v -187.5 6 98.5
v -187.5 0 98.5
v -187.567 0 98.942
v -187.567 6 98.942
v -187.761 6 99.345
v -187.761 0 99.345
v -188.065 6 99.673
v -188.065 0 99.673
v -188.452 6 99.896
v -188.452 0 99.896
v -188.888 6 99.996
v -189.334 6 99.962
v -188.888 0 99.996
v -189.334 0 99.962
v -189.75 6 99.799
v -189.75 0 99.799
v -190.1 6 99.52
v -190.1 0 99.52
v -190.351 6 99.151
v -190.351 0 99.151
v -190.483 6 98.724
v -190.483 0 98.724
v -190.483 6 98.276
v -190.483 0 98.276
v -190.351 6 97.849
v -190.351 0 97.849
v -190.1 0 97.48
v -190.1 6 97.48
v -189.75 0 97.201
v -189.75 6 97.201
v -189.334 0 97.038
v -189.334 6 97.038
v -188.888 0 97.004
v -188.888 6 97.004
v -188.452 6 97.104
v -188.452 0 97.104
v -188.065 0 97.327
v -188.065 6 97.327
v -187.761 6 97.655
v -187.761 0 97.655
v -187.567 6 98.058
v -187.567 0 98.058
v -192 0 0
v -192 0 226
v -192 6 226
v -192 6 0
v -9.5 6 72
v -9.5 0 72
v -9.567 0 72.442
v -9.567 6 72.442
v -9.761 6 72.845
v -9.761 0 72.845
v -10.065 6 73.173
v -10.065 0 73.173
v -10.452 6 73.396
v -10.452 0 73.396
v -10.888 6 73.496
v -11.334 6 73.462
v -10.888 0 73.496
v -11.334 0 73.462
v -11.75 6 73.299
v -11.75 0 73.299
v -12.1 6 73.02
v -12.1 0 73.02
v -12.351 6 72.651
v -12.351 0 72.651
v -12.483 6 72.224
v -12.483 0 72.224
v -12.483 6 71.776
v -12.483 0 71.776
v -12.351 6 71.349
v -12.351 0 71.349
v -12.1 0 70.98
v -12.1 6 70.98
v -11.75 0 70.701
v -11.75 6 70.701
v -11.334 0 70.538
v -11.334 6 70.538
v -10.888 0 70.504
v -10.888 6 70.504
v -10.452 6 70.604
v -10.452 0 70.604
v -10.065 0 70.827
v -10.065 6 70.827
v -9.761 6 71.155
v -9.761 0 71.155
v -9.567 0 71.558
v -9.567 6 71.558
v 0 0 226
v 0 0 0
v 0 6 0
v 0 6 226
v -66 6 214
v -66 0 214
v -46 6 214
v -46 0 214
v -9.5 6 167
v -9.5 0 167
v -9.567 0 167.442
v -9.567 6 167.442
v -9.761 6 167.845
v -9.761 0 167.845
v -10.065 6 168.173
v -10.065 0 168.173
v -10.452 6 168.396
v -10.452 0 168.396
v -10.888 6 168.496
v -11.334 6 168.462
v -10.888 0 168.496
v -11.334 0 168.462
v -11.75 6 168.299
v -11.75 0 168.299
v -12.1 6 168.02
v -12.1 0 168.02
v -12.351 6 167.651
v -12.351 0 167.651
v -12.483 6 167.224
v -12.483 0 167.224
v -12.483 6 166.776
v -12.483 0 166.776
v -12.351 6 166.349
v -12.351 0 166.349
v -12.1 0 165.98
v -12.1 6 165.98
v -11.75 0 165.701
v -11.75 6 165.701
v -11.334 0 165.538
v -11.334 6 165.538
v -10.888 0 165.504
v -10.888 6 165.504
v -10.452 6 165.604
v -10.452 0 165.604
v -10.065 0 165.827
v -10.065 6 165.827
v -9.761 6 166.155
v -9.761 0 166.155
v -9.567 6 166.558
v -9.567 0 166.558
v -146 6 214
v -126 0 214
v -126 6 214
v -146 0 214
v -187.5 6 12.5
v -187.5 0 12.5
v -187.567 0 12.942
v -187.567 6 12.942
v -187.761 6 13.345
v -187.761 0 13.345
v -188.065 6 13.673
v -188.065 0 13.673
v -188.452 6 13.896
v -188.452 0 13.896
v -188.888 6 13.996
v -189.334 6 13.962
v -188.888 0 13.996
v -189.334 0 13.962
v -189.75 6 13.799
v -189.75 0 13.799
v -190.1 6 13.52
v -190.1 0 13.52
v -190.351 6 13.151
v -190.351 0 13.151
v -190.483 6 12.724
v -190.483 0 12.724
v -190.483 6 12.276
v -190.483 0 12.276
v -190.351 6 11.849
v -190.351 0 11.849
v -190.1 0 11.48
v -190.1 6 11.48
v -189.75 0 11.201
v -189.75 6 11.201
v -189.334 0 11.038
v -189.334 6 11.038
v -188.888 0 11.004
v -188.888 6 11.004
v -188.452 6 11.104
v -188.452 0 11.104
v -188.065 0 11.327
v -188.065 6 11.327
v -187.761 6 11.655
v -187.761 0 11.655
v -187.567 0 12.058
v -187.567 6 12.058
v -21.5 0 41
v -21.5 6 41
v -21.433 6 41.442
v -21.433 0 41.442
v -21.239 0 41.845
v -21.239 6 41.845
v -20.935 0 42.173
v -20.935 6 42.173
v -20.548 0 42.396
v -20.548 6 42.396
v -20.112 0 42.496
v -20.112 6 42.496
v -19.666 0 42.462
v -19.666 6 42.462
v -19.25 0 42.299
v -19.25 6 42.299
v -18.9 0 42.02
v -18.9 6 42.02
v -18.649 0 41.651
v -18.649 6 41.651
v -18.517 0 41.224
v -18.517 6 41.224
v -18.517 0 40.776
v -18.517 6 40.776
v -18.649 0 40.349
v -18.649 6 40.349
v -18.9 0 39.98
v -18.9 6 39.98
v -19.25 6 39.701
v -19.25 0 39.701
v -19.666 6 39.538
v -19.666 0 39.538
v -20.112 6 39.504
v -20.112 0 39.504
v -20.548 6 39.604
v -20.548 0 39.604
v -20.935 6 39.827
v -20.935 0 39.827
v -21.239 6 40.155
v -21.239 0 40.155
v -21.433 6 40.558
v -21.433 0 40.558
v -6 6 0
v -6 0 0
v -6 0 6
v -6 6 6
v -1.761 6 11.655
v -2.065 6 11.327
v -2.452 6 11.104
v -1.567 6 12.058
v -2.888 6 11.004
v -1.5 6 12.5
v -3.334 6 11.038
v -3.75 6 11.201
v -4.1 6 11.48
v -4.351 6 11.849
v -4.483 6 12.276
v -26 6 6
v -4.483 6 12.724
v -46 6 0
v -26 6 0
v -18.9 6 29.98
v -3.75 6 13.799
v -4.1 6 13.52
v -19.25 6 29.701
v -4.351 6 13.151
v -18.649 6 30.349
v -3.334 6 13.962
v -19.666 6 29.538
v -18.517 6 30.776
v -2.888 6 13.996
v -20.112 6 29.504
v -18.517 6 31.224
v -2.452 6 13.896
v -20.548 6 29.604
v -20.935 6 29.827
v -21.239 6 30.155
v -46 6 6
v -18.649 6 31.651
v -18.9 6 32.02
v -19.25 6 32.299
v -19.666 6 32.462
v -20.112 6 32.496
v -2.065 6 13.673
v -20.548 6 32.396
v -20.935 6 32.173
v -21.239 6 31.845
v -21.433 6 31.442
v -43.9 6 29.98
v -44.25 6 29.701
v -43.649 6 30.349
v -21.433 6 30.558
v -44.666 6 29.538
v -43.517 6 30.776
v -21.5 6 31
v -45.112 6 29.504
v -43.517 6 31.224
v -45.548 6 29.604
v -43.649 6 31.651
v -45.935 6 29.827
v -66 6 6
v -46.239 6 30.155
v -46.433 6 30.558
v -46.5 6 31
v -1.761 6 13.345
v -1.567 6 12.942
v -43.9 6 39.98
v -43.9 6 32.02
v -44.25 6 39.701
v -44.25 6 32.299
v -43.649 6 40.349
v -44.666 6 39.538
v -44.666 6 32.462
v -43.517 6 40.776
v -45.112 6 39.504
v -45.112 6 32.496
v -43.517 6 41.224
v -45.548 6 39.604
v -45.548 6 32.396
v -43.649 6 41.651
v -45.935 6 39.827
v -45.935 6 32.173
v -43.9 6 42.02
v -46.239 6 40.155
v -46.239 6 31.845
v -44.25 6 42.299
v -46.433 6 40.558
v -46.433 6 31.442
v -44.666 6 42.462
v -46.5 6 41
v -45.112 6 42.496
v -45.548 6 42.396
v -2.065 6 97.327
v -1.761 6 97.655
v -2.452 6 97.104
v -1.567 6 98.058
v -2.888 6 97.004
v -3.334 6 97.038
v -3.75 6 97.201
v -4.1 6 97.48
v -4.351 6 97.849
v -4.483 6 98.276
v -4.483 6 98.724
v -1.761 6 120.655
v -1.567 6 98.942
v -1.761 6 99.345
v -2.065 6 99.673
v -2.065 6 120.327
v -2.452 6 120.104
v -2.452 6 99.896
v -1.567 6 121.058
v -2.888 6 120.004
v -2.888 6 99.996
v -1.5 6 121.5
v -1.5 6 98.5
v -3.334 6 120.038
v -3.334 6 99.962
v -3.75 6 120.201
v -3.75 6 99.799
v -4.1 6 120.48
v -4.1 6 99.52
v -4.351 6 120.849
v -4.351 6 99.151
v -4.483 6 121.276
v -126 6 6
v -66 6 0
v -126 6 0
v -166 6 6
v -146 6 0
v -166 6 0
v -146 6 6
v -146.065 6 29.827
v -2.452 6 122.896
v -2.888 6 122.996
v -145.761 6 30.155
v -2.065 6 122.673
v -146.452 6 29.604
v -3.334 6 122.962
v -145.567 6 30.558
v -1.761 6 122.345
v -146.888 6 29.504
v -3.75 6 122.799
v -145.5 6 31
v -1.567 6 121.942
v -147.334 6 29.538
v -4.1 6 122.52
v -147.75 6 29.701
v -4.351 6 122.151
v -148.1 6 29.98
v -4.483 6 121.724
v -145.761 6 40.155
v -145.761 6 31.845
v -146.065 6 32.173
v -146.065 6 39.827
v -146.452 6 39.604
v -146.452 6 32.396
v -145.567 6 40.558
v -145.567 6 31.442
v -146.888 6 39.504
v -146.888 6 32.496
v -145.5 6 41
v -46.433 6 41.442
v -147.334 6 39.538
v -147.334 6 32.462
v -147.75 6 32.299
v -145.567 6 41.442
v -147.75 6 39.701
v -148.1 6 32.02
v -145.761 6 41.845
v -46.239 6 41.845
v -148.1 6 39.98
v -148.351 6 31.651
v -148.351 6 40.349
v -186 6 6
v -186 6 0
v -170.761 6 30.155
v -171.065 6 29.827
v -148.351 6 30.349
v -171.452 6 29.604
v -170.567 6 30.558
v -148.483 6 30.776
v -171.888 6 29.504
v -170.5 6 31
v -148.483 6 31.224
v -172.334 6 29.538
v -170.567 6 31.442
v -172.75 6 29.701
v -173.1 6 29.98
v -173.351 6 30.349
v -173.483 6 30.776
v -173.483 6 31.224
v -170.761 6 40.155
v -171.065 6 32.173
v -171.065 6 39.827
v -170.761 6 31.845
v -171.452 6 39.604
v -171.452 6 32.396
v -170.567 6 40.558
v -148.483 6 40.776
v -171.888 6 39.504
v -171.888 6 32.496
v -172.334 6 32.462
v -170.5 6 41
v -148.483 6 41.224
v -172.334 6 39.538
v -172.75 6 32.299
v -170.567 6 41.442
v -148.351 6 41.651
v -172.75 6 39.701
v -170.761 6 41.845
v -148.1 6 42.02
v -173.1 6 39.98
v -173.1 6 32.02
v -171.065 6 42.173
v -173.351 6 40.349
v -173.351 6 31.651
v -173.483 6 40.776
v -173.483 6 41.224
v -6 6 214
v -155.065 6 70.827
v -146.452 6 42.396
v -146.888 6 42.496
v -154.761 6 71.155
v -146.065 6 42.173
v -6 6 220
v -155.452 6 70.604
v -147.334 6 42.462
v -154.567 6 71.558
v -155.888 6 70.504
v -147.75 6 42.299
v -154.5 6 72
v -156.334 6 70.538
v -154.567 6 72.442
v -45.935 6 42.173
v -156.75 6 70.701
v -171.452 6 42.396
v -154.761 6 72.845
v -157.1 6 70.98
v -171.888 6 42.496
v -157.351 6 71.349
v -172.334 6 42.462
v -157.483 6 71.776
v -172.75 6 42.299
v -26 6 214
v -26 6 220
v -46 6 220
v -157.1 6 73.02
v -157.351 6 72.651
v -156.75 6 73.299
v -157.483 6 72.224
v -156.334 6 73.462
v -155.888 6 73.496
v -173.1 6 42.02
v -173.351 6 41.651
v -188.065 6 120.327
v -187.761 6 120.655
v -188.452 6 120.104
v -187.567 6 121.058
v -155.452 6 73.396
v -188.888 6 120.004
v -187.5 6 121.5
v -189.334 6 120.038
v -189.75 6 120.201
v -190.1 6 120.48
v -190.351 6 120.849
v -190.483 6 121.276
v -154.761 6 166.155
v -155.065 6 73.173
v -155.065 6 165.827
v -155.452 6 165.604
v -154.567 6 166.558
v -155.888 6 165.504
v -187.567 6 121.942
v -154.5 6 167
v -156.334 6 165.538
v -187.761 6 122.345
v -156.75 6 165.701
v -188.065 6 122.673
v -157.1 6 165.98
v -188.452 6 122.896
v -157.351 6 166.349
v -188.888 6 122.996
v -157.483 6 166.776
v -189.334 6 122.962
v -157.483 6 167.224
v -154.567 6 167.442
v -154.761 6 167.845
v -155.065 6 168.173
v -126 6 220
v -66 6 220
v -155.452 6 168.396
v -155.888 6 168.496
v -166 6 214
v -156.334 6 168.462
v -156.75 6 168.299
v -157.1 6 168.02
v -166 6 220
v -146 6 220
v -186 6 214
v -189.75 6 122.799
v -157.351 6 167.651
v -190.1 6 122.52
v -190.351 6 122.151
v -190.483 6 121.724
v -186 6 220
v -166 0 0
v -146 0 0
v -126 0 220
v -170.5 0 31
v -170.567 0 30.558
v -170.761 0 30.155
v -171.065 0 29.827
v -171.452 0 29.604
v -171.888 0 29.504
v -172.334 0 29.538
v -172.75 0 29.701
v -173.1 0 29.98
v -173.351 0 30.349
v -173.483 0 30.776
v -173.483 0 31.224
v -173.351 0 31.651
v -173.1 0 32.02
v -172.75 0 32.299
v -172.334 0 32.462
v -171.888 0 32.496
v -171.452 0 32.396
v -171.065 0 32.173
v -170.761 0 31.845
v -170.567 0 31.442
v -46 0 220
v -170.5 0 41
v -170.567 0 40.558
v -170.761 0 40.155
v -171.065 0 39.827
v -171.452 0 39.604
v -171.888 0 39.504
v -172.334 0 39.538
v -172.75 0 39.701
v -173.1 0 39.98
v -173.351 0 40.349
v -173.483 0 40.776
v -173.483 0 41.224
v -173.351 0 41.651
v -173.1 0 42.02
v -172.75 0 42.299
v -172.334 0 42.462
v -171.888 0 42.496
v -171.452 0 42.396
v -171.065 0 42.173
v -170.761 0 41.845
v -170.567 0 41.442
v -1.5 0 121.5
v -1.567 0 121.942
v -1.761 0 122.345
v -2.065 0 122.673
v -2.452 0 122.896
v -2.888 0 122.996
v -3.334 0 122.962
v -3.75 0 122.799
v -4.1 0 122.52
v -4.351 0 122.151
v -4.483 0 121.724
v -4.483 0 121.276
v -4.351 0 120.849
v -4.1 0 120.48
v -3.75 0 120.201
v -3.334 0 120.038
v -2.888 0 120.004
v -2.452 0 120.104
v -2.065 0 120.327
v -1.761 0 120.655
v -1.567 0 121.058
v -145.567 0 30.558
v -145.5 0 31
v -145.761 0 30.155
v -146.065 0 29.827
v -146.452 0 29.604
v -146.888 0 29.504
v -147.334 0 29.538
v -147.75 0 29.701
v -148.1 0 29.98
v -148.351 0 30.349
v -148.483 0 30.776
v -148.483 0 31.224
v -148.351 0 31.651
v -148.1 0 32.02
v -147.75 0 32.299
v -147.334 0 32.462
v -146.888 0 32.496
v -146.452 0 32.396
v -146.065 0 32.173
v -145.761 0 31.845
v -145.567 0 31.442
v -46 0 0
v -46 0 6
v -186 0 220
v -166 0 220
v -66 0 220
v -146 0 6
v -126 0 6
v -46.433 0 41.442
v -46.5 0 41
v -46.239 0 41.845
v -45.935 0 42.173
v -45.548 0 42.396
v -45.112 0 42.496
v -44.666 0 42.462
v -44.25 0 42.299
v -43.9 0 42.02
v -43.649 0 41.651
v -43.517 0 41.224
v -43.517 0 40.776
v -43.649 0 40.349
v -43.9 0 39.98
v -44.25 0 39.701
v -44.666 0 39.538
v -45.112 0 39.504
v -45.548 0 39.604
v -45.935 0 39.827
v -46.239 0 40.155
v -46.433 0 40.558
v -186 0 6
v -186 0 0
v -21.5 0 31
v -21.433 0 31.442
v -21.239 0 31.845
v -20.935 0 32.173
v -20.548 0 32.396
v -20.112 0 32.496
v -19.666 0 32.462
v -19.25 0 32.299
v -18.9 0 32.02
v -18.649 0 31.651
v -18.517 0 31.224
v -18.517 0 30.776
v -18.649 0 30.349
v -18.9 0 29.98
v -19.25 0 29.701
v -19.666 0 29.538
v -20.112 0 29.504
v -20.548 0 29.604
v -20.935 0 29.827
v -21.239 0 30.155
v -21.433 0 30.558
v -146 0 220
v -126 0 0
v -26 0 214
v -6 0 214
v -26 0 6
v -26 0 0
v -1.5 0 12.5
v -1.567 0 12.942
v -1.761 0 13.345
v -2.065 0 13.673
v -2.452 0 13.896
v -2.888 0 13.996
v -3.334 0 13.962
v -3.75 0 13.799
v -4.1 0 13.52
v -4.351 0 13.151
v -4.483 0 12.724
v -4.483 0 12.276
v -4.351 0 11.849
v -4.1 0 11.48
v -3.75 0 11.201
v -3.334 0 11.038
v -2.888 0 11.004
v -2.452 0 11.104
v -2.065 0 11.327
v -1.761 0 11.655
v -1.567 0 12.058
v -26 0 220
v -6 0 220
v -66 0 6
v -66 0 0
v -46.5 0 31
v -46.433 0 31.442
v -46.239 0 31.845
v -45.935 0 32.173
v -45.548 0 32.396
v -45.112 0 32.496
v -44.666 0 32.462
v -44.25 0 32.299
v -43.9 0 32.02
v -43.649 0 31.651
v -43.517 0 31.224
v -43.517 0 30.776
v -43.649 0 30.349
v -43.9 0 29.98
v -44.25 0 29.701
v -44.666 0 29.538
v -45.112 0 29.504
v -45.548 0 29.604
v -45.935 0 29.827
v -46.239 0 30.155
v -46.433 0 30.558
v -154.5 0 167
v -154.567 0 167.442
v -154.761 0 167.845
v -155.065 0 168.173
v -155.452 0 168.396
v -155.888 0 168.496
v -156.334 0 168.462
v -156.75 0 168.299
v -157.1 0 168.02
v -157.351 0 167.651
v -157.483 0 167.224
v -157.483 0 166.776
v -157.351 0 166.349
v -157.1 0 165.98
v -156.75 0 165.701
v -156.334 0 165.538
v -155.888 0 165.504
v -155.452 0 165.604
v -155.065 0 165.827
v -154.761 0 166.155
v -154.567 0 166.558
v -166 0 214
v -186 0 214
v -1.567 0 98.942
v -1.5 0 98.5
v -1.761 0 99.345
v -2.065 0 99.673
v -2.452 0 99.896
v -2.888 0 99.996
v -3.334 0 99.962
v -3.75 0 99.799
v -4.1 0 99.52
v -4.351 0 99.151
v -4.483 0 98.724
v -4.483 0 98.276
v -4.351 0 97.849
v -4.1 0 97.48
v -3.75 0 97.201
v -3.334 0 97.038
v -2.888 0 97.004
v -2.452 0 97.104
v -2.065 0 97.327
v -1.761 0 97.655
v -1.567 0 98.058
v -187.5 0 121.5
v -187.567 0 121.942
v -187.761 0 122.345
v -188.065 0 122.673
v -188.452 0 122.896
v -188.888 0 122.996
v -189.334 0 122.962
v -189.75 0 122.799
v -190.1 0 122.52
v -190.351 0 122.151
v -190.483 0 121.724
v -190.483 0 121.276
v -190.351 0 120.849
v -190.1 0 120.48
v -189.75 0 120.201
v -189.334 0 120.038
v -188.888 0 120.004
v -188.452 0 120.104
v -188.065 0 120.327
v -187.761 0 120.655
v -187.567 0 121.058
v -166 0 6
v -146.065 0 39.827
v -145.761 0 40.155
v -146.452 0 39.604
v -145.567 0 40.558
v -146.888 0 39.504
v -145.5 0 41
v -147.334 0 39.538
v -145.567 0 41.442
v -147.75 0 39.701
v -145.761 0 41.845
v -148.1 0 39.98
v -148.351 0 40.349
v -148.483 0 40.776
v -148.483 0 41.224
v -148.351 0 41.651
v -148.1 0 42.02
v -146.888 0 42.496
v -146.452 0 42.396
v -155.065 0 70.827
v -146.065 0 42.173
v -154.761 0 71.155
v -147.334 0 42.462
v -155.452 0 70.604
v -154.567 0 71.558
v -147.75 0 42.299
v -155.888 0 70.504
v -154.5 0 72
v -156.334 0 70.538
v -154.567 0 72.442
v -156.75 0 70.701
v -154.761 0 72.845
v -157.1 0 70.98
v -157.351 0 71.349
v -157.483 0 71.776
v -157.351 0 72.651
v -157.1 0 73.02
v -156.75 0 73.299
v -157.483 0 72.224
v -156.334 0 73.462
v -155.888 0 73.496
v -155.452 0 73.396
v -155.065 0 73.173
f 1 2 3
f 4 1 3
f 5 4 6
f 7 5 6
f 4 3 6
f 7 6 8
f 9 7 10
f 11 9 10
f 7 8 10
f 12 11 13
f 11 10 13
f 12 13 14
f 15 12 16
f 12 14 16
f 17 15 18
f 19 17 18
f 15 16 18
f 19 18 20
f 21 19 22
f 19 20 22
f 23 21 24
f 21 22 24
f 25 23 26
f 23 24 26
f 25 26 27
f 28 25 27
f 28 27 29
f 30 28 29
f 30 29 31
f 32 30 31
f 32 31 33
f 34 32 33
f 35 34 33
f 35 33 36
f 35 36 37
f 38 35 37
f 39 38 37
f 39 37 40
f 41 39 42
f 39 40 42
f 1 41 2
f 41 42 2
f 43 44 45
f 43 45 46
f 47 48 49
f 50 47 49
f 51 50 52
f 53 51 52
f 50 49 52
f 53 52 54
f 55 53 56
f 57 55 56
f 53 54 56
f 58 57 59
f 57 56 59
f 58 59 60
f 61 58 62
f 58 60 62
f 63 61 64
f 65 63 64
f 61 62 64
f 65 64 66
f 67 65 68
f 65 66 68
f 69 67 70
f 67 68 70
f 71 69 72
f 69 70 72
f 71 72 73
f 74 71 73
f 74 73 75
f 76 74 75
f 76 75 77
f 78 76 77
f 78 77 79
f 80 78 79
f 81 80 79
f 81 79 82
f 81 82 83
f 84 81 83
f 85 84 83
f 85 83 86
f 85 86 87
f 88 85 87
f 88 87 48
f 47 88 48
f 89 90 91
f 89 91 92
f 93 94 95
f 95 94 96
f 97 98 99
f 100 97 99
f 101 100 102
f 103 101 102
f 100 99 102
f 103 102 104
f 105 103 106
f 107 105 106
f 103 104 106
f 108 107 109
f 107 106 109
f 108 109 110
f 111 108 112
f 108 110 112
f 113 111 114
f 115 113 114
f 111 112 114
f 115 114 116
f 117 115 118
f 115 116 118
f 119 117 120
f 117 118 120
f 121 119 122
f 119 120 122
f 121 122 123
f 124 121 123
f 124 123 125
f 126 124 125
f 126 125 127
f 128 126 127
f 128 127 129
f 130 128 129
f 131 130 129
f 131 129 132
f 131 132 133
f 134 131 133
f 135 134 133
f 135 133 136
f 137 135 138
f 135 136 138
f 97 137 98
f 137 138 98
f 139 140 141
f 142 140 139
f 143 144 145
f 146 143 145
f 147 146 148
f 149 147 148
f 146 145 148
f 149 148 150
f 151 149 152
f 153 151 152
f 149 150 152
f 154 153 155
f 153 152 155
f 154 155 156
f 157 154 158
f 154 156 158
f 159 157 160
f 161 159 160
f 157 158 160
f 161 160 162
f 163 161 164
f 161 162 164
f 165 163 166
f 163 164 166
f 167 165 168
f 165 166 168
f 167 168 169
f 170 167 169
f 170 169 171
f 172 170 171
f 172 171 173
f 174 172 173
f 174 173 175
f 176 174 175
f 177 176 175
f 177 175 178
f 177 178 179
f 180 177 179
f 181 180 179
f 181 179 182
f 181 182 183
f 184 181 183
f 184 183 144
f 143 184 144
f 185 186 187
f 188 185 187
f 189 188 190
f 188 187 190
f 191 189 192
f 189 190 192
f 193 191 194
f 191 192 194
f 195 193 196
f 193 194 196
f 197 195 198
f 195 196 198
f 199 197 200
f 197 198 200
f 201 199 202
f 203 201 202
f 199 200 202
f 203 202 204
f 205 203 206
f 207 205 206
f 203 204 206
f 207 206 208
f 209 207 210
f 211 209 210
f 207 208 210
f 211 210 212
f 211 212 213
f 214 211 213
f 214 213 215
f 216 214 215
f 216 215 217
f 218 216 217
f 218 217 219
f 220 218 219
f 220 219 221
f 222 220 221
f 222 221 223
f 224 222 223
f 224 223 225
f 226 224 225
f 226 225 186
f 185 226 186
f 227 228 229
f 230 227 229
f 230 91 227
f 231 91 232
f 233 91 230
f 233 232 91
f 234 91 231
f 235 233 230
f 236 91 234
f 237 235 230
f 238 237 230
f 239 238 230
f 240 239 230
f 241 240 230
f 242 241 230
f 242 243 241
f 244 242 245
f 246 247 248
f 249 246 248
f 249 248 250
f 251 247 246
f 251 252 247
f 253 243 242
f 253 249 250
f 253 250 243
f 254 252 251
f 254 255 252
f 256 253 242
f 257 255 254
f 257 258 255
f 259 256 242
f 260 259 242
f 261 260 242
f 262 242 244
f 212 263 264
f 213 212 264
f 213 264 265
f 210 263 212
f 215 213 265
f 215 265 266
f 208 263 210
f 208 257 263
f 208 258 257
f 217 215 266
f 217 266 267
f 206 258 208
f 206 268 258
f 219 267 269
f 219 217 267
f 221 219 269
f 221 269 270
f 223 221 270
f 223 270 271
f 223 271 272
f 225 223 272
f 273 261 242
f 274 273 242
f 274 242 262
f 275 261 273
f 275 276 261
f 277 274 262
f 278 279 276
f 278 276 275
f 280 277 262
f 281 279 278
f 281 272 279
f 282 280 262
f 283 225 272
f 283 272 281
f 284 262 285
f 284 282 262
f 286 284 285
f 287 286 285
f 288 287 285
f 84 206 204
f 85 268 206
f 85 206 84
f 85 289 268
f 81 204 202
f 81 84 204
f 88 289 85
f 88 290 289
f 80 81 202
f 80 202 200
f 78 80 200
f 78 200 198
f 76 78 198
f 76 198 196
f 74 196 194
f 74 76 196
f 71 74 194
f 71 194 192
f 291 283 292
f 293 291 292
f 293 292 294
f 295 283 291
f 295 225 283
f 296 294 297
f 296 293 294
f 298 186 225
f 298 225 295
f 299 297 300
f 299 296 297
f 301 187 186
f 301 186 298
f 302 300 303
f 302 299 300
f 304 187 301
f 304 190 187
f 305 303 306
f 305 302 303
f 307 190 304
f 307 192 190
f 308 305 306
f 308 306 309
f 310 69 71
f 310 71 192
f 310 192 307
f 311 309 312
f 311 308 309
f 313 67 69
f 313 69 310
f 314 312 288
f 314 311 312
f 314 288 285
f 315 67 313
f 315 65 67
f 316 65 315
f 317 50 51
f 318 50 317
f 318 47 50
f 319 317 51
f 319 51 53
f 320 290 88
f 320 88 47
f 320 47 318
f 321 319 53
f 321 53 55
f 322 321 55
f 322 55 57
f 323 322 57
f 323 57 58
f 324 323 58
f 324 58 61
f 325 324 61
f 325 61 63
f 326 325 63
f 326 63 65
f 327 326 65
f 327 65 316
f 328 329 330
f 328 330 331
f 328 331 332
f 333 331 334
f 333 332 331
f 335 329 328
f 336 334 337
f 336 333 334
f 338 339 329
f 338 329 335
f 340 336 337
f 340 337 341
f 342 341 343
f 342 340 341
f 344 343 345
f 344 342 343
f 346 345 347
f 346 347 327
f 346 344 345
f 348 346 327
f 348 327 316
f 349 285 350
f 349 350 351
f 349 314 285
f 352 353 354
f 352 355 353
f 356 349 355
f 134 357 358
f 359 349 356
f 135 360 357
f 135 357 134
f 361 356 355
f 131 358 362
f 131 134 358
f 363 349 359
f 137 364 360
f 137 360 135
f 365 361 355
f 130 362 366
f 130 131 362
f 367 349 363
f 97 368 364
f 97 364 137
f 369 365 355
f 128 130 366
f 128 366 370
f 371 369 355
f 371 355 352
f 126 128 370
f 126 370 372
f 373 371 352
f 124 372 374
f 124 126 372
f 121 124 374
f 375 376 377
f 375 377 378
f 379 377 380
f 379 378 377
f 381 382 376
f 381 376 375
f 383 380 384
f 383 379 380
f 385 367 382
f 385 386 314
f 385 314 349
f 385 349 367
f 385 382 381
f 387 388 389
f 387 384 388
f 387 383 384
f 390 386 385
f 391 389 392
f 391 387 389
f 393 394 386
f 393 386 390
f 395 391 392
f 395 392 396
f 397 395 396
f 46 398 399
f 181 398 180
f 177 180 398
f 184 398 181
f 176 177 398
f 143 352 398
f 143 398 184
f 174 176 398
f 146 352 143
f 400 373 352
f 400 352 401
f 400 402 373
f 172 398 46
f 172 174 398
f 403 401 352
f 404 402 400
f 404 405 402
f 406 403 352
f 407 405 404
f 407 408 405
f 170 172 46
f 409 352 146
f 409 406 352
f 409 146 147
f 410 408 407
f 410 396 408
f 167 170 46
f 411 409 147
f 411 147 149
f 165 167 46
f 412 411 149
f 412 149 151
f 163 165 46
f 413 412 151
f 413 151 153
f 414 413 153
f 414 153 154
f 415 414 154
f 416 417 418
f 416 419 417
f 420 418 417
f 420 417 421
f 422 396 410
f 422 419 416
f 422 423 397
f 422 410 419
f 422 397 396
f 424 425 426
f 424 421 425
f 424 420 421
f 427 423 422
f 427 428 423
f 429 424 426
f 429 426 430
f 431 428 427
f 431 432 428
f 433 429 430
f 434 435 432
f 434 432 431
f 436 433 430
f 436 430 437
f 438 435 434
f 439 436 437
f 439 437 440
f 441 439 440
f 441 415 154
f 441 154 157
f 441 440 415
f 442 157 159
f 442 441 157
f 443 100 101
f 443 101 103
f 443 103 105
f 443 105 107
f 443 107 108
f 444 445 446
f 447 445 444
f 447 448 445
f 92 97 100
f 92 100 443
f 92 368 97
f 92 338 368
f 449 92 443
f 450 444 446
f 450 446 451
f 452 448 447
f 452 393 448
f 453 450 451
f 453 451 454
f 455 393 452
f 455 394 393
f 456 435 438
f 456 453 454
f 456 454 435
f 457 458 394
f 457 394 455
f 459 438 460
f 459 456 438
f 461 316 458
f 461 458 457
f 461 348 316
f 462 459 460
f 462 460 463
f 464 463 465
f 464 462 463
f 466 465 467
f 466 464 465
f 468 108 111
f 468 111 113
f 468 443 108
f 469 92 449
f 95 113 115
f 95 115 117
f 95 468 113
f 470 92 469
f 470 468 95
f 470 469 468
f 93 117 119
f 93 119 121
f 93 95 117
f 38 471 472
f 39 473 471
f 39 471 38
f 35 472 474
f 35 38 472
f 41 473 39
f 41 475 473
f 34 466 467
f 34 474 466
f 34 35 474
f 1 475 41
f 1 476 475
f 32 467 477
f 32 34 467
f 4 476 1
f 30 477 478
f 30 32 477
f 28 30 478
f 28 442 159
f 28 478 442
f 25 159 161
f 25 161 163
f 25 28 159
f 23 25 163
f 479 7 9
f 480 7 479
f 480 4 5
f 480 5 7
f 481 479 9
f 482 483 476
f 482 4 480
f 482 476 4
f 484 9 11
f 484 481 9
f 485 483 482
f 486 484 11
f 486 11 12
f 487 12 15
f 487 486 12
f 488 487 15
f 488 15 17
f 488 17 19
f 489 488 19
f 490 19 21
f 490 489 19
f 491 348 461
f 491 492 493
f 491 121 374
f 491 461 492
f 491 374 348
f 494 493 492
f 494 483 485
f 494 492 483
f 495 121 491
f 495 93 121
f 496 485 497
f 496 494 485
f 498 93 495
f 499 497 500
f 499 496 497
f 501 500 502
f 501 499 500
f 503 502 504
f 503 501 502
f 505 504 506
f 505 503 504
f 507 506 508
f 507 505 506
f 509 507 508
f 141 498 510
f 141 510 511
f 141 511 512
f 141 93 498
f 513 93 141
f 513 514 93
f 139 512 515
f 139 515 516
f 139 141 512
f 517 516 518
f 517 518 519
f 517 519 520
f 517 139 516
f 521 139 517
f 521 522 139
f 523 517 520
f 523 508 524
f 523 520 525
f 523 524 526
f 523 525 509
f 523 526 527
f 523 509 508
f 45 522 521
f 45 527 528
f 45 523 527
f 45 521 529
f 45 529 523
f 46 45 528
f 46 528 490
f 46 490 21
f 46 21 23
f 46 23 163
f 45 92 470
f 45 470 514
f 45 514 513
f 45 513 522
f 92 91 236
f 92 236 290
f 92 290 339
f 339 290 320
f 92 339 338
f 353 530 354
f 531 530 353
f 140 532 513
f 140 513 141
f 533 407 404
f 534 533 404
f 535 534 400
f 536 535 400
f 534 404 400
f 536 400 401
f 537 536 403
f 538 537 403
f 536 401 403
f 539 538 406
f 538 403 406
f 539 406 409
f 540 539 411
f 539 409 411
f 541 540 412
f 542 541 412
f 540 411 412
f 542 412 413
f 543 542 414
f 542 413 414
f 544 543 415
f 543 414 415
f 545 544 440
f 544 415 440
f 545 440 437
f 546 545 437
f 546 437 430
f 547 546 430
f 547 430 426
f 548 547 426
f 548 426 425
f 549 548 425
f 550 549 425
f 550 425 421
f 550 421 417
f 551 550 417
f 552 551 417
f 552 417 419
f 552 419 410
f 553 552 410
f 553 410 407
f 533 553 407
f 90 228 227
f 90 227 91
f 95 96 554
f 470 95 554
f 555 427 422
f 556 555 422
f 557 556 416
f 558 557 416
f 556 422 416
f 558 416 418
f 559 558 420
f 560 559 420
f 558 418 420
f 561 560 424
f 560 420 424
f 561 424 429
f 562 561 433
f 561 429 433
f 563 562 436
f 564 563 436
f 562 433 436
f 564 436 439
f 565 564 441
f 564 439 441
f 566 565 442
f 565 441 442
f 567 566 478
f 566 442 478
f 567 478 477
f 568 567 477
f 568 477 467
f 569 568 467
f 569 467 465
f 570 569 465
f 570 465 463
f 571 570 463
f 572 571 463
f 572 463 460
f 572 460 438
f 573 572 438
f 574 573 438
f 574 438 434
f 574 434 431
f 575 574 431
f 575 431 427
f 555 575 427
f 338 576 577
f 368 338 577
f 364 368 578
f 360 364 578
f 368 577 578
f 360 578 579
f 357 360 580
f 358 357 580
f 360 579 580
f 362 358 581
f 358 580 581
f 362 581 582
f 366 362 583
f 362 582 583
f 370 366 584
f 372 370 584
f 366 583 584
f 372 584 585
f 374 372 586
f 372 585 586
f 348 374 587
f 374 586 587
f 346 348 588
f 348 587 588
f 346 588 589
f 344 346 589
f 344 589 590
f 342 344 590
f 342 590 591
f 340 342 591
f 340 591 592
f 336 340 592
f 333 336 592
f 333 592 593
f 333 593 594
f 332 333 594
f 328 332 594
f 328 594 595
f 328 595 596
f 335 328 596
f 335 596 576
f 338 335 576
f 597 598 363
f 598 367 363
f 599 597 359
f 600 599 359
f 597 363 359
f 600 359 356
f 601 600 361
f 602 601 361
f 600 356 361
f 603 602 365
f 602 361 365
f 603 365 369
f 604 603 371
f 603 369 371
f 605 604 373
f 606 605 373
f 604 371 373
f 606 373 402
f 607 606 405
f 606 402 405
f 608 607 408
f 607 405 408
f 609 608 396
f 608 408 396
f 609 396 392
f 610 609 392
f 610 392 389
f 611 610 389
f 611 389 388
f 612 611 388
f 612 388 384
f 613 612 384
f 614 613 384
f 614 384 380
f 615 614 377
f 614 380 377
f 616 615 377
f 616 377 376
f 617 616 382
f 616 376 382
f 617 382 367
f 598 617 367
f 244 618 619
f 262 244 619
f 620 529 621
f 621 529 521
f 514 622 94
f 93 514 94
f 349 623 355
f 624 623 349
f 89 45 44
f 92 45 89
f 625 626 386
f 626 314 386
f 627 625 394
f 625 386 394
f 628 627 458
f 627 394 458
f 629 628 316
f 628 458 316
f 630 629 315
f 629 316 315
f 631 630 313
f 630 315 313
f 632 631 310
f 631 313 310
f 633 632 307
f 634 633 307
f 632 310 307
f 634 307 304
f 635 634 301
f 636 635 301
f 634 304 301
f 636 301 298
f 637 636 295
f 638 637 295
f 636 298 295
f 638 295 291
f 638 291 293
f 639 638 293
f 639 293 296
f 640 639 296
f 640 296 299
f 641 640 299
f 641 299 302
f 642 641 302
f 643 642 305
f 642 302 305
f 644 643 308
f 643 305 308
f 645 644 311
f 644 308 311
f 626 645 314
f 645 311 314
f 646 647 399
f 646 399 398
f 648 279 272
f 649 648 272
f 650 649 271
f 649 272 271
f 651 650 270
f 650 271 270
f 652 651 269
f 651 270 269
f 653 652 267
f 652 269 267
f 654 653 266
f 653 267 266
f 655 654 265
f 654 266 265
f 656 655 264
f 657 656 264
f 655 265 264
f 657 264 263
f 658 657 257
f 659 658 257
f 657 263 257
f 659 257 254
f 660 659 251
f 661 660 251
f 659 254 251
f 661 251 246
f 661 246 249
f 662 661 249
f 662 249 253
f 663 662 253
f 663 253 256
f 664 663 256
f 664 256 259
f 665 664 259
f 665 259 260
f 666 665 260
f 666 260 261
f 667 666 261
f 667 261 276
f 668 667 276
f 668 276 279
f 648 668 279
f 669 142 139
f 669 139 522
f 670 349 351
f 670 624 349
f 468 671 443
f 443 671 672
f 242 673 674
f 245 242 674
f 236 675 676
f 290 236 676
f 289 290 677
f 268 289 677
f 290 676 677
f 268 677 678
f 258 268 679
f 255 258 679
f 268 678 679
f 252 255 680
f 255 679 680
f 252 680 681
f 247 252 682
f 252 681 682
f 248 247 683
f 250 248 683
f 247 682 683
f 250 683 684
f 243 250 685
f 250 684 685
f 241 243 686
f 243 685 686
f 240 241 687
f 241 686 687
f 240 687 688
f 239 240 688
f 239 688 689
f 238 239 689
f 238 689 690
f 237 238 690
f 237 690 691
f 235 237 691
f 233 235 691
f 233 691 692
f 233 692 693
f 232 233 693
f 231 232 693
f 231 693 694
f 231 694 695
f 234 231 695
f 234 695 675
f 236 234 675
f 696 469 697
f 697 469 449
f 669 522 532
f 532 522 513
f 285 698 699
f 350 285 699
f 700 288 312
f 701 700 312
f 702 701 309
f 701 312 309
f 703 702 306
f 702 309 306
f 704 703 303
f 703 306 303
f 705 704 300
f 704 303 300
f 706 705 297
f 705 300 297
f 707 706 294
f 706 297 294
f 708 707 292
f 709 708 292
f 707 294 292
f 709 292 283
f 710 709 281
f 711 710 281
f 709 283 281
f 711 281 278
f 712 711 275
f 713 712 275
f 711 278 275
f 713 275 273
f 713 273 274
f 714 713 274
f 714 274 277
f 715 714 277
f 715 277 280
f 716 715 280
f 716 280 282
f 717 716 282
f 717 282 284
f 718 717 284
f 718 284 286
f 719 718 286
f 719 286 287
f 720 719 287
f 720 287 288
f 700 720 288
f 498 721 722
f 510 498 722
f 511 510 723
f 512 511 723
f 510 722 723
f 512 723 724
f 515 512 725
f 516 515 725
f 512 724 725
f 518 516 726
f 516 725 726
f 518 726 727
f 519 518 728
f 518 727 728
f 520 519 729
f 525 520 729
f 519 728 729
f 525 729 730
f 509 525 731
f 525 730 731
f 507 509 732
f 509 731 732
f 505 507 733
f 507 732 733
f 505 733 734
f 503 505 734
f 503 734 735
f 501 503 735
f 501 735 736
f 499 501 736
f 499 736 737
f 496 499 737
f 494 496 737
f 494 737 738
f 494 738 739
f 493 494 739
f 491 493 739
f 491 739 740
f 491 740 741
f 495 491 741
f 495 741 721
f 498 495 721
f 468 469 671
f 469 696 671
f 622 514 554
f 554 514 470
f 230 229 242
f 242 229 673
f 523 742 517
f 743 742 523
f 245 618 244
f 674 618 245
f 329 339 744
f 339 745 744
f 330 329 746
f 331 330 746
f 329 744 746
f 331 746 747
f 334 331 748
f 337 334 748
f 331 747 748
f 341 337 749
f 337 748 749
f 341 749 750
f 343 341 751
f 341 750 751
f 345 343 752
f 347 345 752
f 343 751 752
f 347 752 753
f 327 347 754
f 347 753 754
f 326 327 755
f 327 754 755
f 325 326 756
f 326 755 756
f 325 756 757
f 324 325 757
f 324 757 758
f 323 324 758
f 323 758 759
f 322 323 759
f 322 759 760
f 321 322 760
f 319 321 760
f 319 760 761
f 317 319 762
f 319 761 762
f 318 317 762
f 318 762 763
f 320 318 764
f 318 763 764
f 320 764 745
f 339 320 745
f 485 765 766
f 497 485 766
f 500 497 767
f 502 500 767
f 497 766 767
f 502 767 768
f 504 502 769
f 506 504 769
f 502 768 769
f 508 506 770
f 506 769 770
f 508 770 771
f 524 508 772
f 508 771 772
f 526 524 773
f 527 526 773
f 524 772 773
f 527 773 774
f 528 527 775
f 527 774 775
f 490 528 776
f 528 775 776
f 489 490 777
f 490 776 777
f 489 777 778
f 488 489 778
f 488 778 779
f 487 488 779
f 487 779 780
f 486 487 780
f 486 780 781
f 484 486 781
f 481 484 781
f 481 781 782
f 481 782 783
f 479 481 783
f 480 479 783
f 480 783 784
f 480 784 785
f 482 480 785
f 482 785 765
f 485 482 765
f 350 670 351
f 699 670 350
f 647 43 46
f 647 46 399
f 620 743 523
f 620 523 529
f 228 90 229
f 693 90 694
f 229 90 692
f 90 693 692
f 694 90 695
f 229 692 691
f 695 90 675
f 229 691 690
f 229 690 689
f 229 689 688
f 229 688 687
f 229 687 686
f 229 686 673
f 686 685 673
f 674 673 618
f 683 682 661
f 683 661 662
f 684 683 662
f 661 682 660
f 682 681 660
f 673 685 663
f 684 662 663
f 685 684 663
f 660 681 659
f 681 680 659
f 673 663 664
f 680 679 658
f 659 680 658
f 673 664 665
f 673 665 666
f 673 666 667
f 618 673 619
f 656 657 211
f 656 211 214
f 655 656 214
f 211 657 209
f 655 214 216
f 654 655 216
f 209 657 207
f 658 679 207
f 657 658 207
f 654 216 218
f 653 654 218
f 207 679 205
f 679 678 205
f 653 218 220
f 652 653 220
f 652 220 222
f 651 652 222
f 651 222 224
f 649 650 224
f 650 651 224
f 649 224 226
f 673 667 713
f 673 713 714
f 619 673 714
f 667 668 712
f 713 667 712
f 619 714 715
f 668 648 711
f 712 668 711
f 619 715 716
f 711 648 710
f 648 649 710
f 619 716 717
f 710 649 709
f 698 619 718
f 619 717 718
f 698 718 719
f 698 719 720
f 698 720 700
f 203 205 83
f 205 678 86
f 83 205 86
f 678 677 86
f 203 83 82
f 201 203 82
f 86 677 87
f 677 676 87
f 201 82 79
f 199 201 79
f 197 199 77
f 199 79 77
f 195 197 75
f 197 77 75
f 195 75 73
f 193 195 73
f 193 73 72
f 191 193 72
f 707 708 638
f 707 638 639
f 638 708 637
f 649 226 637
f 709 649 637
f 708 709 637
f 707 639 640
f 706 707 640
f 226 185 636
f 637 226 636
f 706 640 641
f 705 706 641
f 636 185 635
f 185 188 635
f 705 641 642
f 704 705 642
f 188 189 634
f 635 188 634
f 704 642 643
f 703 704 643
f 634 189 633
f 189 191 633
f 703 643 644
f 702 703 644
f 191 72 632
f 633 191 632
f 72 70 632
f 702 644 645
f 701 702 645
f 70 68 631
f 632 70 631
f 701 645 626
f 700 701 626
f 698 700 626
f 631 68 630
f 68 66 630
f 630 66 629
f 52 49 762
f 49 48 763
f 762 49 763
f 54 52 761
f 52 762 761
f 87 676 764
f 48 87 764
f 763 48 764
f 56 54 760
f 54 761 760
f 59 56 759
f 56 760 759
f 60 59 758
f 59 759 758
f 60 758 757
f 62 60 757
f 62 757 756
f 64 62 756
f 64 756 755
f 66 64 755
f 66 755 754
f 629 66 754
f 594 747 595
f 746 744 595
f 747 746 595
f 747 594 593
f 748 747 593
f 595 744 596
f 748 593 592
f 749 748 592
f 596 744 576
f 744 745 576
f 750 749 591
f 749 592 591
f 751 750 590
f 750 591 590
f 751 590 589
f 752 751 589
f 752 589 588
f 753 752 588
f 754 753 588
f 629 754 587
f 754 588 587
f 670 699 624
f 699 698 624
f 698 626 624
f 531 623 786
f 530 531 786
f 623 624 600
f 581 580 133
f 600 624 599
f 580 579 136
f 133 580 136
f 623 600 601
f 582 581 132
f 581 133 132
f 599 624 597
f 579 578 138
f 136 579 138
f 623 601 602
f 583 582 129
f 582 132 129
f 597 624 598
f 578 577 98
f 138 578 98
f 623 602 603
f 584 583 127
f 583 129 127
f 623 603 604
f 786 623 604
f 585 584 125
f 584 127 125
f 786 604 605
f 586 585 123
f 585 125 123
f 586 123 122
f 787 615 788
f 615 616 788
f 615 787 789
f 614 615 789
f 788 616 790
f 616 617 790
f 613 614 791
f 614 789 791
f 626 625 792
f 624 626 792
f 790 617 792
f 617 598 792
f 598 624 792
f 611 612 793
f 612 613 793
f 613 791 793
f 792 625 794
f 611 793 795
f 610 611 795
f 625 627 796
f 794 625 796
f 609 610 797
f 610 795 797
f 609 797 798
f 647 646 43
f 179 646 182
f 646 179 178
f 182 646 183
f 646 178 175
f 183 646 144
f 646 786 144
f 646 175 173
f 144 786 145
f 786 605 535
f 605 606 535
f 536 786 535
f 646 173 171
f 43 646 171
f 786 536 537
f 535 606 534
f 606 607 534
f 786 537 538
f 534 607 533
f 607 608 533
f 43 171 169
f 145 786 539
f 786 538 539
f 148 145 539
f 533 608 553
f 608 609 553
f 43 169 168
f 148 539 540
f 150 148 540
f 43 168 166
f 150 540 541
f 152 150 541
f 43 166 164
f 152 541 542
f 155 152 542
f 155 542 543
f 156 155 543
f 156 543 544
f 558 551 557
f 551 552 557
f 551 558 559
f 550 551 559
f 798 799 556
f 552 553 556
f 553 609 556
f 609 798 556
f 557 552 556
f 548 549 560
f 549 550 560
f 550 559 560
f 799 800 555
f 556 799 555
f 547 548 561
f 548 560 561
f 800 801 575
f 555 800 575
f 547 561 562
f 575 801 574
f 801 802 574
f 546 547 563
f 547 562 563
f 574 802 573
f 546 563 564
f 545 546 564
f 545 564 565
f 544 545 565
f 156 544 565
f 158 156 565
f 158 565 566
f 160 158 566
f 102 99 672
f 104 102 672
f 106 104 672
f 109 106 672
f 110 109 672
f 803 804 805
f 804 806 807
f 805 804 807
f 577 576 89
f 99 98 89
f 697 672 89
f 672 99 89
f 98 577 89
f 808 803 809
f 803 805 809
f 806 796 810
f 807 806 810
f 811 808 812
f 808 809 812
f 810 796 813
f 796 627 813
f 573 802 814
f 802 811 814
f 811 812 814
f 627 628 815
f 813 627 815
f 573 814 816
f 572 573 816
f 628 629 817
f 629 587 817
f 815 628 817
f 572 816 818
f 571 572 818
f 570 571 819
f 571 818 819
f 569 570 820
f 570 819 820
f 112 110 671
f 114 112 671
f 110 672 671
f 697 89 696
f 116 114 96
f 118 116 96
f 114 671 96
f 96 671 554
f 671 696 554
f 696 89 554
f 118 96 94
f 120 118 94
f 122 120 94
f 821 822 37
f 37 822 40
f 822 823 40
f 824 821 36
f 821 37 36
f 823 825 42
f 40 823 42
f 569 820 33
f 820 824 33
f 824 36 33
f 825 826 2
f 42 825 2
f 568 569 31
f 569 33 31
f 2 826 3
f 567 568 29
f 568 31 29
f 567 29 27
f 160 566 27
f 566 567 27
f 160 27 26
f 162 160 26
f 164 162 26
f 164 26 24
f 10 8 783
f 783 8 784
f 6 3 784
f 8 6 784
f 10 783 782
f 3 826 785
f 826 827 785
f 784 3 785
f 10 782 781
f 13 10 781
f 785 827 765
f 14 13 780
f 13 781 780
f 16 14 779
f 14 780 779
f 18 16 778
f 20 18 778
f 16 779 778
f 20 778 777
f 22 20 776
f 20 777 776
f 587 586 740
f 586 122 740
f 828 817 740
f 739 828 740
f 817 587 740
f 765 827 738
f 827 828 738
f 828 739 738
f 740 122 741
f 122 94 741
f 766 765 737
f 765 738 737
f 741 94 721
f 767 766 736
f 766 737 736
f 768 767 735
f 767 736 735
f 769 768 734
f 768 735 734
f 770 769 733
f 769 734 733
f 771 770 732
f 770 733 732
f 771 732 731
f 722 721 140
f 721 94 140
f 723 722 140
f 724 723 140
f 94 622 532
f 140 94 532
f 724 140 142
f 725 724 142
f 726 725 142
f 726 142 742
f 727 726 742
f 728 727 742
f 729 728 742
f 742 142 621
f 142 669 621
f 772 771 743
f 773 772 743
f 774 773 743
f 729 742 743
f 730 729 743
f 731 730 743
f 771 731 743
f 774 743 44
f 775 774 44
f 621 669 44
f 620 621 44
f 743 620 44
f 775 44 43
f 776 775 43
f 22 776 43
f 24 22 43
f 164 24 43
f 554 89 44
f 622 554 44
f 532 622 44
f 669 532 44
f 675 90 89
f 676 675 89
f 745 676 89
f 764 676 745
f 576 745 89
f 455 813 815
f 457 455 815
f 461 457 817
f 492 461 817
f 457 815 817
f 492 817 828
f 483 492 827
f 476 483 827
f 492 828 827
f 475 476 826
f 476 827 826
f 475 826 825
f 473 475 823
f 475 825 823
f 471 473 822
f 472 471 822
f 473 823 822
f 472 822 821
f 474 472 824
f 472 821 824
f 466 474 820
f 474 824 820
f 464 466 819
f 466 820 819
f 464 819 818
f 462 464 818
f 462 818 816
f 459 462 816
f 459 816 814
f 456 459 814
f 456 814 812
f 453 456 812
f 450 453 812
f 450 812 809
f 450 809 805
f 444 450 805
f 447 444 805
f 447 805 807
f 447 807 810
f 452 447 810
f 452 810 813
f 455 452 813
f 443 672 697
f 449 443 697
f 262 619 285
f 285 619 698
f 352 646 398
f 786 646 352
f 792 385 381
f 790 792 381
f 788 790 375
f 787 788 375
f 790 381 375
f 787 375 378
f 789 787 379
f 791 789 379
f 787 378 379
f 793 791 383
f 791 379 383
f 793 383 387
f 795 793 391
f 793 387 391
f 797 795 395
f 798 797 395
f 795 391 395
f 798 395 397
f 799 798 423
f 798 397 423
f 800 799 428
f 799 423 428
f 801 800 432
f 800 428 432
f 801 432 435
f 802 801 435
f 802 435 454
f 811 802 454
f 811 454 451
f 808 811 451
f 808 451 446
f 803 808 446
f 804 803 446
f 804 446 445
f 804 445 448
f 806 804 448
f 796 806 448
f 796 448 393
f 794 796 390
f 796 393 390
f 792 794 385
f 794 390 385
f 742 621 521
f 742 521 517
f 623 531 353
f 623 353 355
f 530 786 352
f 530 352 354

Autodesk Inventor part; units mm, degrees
ref_plane "YZ Plane" through (0, 0, 0) normal (1, 0, 0) x (0, 1, 0)
sketch "Эскиз1" plane through (0, 0, 0) normal (0, 1, 0) x (-1, 0, 0)
  line L0 (0, 220) -> (192, 220)
  line L1 (192, 220) -> (192, 0)
  line L2 (192, 0) -> (0, 0)
  line L3 (0, 0) -> (0, 220)
  circle A0 centre (11, 217) radius 1.5
  circle A1 centre (181, 217) radius 1.5
  circle A2 centre (5, 3) radius 1.5
  circle A3 centre (187, 3) radius 1.5
  line L4 (186, 6) -> (6, 6)
  line L5 (6, 6) -> (6, 244)
  line L6 (6, 244) -> (186, 244)
  line L7 (186, 244) -> (186, 6)
  dimension "d0" = 192
  dimension "d1" = 170
  dimension "d2" = 220
  dimension "d3" = 11
  dimension "d4" = 3
  dimension "d5" = 3
  dimension "d6" = 3
  dimension "d7" = 3
  dimension "d8" = 3
  dimension "d9" = 5
  dimension "d10" = 3
  dimension "d11" = 3
  dimension "d12" = 5
  dimension "d13" = 3
  dimension "d16" = 238
  dimension "d18" = 180
  dimension "d19" = 6
  dimension "d20" = 6
extrude "Выдавливание2" add sketch "Эскиз1" along normal blind 6 contours L0 L5 L4 L7 L1 L2 L3 | L0 L7 L4 L5 | A0 | A1 | A2 | A3
sketch "Эскиз2" plane through (0, 0, 0) normal (0, -1, 0) x (1, 0, 0)
  line L0 (-192, 220) -> (0, 220) projected
  line L1 (-6, 220) -> (-26, 220)
  line L2 (-26, 220) -> (-26, 214)
  line L3 (-26, 214) -> (-6, 214)
  line L4 (-6, 214) -> (-6, 220)
  line L5 (-46, 220) -> (-66, 220)
  line L6 (-66, 220) -> (-66, 214)
  line L7 (-66, 214) -> (-46, 214)
  line L8 (-46, 214) -> (-46, 220)
  line L9 (-186, 220) -> (-166, 220)
  line L10 (-166, 220) -> (-166, 214)
  line L11 (-166, 214) -> (-186, 214)
  line L12 (-186, 214) -> (-186, 220)
  line L13 (-146, 220) -> (-126, 220)
  line L14 (-126, 220) -> (-126, 214)
  line L15 (-126, 214) -> (-146, 214)
  line L16 (-146, 214) -> (-146, 220)
  line L17 (0, 220) -> (0, 0) projected
  line L18 (-192, 0) -> (-192, 220) projected
  point P0 (-66, 217)
  point P1 (-46, 217)
  point P2 (-26, 217)
  point P3 (-146, 217)
  point P4 (-126, 217)
  point P5 (-166, 217)
  point P6 (-186, 217)
  point P7 (-166, 220)
  point P8 (-126, 220)
  dimension "d23" = 6
  dimension "d24" = 20
  dimension "d25" = 6
  dimension "d26" = 20
  dimension "d27" = 20
  dimension "d28" = 20
  dimension "d29" = 20
  dimension "d30" = 20
  dimension "d31" = 6
extrude "Выдавливание3" cut sketch "Эскиз2" against normal through all
ref_plane "РабПлоскость1" through (-126, 0, 110) normal (0, 0, 1) x (1, 0, 0)
mirror "Зеркальное отражение1" about plane through (-126, 0, 110) normal (0, 0, 1) of "Выдавливание3"
sketch "Эскиз3" plane through (0, 0, 0) normal (0, -1, 0) x (1, 0, 0)
  circle A0 centre (-3, 98.5) radius 1.5
  circle A1 centre (-3, 121.5) radius 1.5
  circle A2 centre (-189, 98.5) radius 1.5
  circle A3 centre (-189, 121.5) radius 1.5
  line L0 (-192, 0) -> (-192, 220) projected
  line L1 (-231.3831, 110) -> (44.2986, 110) projected
  line L2 (0, 220) -> (0, 0) projected
  dimension "d34" = 3
  dimension "d35" = 3
  dimension "d36" = 3
  dimension "d37" = 11.5
  dimension "d38" = 3
  dimension "d39" = 11.5
  dimension "d40" = 3
  dimension "d41" = 3
  dimension "d43" = 11.5
  dimension "d44" = 3
  dimension "d45" = 3
  dimension "d46" = 11.5
extrude "Выдавливание4" cut sketch "Эскиз3" against normal blind 10
sketch "Эскиз4" plane through (0, 6, 0) normal (0, 1, 0) x (1, 0, 0)
  line L0 (4.3155, -27.8106) -> (4.3155, -29.0145) projected
  line L1 (4.3155, -43.2101) -> (4.3155, -29.2101) projected
  line L2 (4.3155, -31.8771) -> (4.3155, -40.1101) projected
  line L3 (4.3155, -27.8106) -> (4.3155, -29.0145) projected
  circle A0 centre (-3, -121.5) radius 1.5 projected
  circle A1 centre (-189, -121.5) radius 1.5 projected
  circle A2 centre (-3, -98.5) radius 1.5 projected
  circle A3 centre (-189, -98.5) radius 1.5 projected
  line L4 (-126, 0) -> (-126, -6) projected
  line L5 (-126, -6) -> (-146, -6) projected
  line L6 (-146, -6) -> (-146, 0) projected
  line L7 (-146, 0) -> (-166, 0) projected
  line L8 (-166, 0) -> (-166, -6) projected
  line L9 (-166, -6) -> (-186, -6) projected
  line L10 (-186, -6) -> (-186, 0) projected
  line L11 (-186, 0) -> (-192, 0) projected
  line L12 (-192, 0) -> (-192, -220) projected
  line L13 (-192, -220) -> (-186, -220) projected
  line L14 (-186, -220) -> (-186, -214) projected
  line L15 (-186, -214) -> (-166, -214) projected
  line L16 (-166, -214) -> (-166, -220) projected
  line L17 (-166, -220) -> (-146, -220) projected
  line L18 (-146, -220) -> (-146, -214) projected
  line L19 (-146, -214) -> (-126, -214) projected
  line L20 (-126, -214) -> (-126, -220) projected
  line L21 (-126, -220) -> (-66, -220) projected
  line L22 (-66, -220) -> (-66, -214) projected
  line L23 (-66, -214) -> (-46, -214) projected
  line L24 (-46, -214) -> (-46, -220) projected
  line L25 (-46, -220) -> (-26, -220) projected
  line L26 (-26, -220) -> (-26, -214) projected
  line L27 (-26, -214) -> (-6, -214) projected
  line L28 (-6, -214) -> (-6, -220) projected
  line L29 (-6, -220) -> (0, -220) projected
  line L30 (0, -220) -> (0, 0) projected
  line L31 (0, 0) -> (-6, 0) projected
  line L32 (-6, 0) -> (-6, -6) projected
  line L33 (-6, -6) -> (-26, -6) projected
  line L34 (-26, -6) -> (-26, 0) projected
  line L35 (-26, 0) -> (-46, 0) projected
  line L36 (-46, 0) -> (-46, -6) projected
  line L37 (-46, -6) -> (-66, -6) projected
  line L38 (-66, -6) -> (-66, 0) projected
  line L39 (-66, 0) -> (-126, 0) projected
  line L40 (0, -27.5) -> (0, -30.5) projected
  line L41 (-6, -30.5) -> (-6, -27.5) projected
  line L42 (0, -27.5) -> (0, -30.5) projected
  line L43 (-6, -30.5) -> (-6, -27.5) projected
  line L44 (0, -41.5) -> (0, -44.5) projected
  line L45 (-6, -44.5) -> (-6, -41.5) projected
  line L46 (0, -29) -> (0, -43) projected
  line L47 (-6, -43) -> (-6, -29) projected
  line L48 (0, -41.5) -> (0, -44.5) projected
  line L49 (-6, -44.5) -> (-6, -41.5) projected
  line L50 (4.3155, -22.5218) -> (4.3155, -51.048)
  line L51 (4.9155, -36.9084) -> (0.7155, -36.9084)
  line L52 (4.3155, -22.5218) -> (4.3155, -51.048)
  line L53 (1.3155, -44.914) -> (1.3155, -41.914) projected
  line L54 (4.3155, -44.914) -> (4.3155, -41.914) projected
  line L55 (4.3155, -43.6493) -> (1.3155, -43.6493) projected
  line L56 (4.3155, -40.543) -> (1.3155, -40.543) projected
  line L57 (1.3155, -40.543) -> (1.3155, -46.3135) projected
  line L58 (4.3155, -40.543) -> (4.3155, -46.3135) projected
  line L59 (1.3155, -32.3101) -> (1.3155, -40.543) projected
  line L60 (4.3155, -43.4057) -> (4.3155, -44.6096) projected
  line L61 (4.3155, -32.3101) -> (1.3155, -32.3101) projected
  line L62 (4.3155, -32.3101) -> (4.3155, -40.543) projected
  line L63 (1.3155, -30.9201) -> (1.3155, -27.9201) projected
  line L64 (4.3155, -30.9201) -> (4.3155, -27.9201) projected
  line L65 (1.3155, -26.5206) -> (1.3155, -32.3101) projected
  line L66 (4.3155, -26.5206) -> (4.3155, -32.3101) projected
  line L67 (4.3155, -31.8771) -> (1.3155, -31.8771) projected
  line L68 (4.3155, -28.7709) -> (1.3155, -28.7709) projected
  line L69 (1.3155, -31.8771) -> (1.3155, -40.1101) projected
  line L70 (4.3155, -31.8771) -> (4.3155, -40.1101) projected
  line L71 (1.3155, -43.2101) -> (1.3155, -29.2101) projected
  line L72 (4.3155, -43.2101) -> (4.3155, -29.2101) projected
  line L73 (1.3155, -26.1066) -> (1.3155, -31.8771) projected
  line L74 (4.3155, -26.1066) -> (4.3155, -31.8771) projected
  line L75 (1.3155, -43.4057) -> (1.3155, -44.6096) projected
  line L76 (1.3155, -44.5) -> (1.3155, -41.5) projected
  line L77 (4.3155, -44.5) -> (4.3155, -41.5) projected
  line L78 (4.3155, -43.4057) -> (1.3155, -43.4057) projected
  line L79 (4.3155, -40.1101) -> (1.3155, -40.1101) projected
  line L80 (1.3155, -40.1101) -> (1.3155, -45.8995) projected
  line L81 (4.3155, -40.1101) -> (4.3155, -45.8995) projected
  line L82 (1.3155, -30.5061) -> (1.3155, -27.5061) projected
  line L83 (4.3155, -29.0145) -> (1.3155, -29.0145) projected
  line L84 (4.3155, -27.8106) -> (4.3155, -29.0145) projected
  line L85 (4.3155, -30.5061) -> (4.3155, -27.5061) projected
  line L86 (1.3155, -27.8106) -> (1.3155, -29.0145) projected
  line L87 (4.3155, -41.914) -> (4.3155, -44.914) projected
  line L88 (4.3155, -40.5145) -> (4.3155, -46.3135) projected
  line L89 (4.3155, -43.3697) -> (4.3155, -43.0444) projected
  line L90 (4.3155, -41.5) -> (4.3155, -44.5) projected
  line L91 (4.3155, -40.1005) -> (4.3155, -45.8995) projected
  line L92 (4.3155, -22.2315) -> (4.3155, -52.6365) construction
  line L93 (4.3155, -23.5797) -> (4.3155, -51.7445) construction
  line L94 (4.3155, -35.5823) -> (4.3155, -36.4187) projected
  line L95 (4.3155, -30.9195) -> (4.3155, -41.9147) projected
  line L96 (4.3155, -42.8814) -> (4.3155, -43.61) construction
  line L97 (4.3155, -29.0505) -> (4.3155, -29.2131) projected
  line L98 (4.3155, -29.2101) -> (4.3155, -43.2101) projected
  line L99 (4.3155, -27.8106) -> (4.3155, -44.6096) projected
  line L100 (4.3155, -28.8799) -> (4.3155, -29.6854) construction
  line L101 (4.3155, -29.3758) -> (4.3155, -29.2131) projected
  line L102 (4.3155, -27.9201) -> (4.3155, -30.9201) projected
  line L103 (4.3155, -26.5206) -> (4.3155, -32.3196) projected
  line L104 (4.3155, -27.5061) -> (4.3155, -30.5061) projected
  line L105 (4.3155, -26.1066) -> (4.3155, -31.9056) projected
  line L106 (4.3155, -30.5055) -> (4.3155, -36.0031) projected
  line L107 (4.3155, -41.5007) -> (4.3155, -36.0031) projected
  line L108 (4.3155, -29.6845) -> (4.3155, -30.2653) construction
  point P0 (4.3155, -43.414)
  point P1 (4.3155, -43)
  point P2 (4.3155, -36.2101)
  point P3 (4.3155, -29.4201)
  point P4 (4.3155, -29.0061)
  point P5 (4.3155, -35.9427)
  point P6 (4.3155, -31.8212)
sketch "Эскиз5" plane through (0, 6, 0) normal (0, 1, 0) x (1, 0, 0)
  circle A0 centre (-172, -41) radius 1.5
  circle A1 centre (-172, -31) radius 1.5
  line L0 (-186, -214) -> (-166, -214) projected
  line L1 (-192, 0) -> (-192, -220) projected
  line L2 (-166, -6) -> (-186, -6) projected
  circle A2 centre (-147, -41) radius 1.5
  circle A3 centre (-147, -31) radius 1.5
  point P0 (0, 0)
  dimension "d49" = 3
  dimension "d52" = 20
  dimension "d53" = 10
  dimension "d54" = 3
  dimension "d57" = 25
  dimension "d58" = 20
  dimension "d87" = 3
  dimension "d88" = 25
  dimension "d89" = 25
extrude "Выдавливание5" cut sketch "Эскиз5" against normal blind 10
ref_plane "РабПлоскость2" through (-96, 0, 220) normal (1, 0, 0) x (0, 0, -1)
mirror "Зеркальное отражение2" about plane through (-96, 0, 220) normal (1, 0, 0) of "Выдавливание5"
sketch "Эскиз6" plane through (-126, 0, 220) normal (0, 0, 1) x (1, 0, 0)
  line L0 (-66, 6) -> (126, 6)
  line L1 (126, 6) -> (126, 0)
  line L2 (126, 0) -> (-66, 0)
  line L3 (-66, 0) -> (-66, 6)
  line L4 (-66, 6) -> (-60, 6) projected
  line L5 (-60, 6) -> (-60, 0) projected
  line L6 (-60, 0) -> (-66, 0) projected
  line L7 (-66, 0) -> (-66, 6) projected
  line L8 (-40, 6) -> (-20, 6) projected
  line L9 (-20, 6) -> (-20, 0) projected
  line L10 (-20, 0) -> (-40, 0) projected
  line L11 (-40, 0) -> (-40, 6) projected
  line L12 (0, 6) -> (60, 6) projected
  line L13 (60, 6) -> (60, 0) projected
  line L14 (60, 0) -> (0, 0) projected
  line L15 (0, 0) -> (0, 6) projected
  line L16 (80, 6) -> (100, 6) projected
  line L17 (100, 6) -> (100, 0) projected
  line L18 (100, 0) -> (80, 0) projected
  line L19 (80, 0) -> (80, 6) projected
  line L20 (120, 6) -> (126, 6) projected
  line L21 (126, 6) -> (126, 0) projected
  line L22 (126, 0) -> (120, 0) projected
  line L23 (120, 0) -> (120, 6) projected
  line L24 (-66, 6) -> (-60, 6) projected
  line L25 (-60, 6) -> (-60, 0) projected
  line L26 (-60, 0) -> (-66, 0) projected
  line L27 (-40, 6) -> (-20, 6) projected
  line L28 (-20, 6) -> (-20, 0) projected
  line L29 (-20, 0) -> (-40, 0) projected
  line L30 (-40, 0) -> (-40, 6) projected
  line L31 (0, 6) -> (60, 6) projected
  line L32 (60, 6) -> (60, 0) projected
  line L33 (60, 0) -> (0, 0) projected
  line L34 (0, 0) -> (0, 6) projected
  line L35 (80, 6) -> (100, 6) projected
  line L36 (100, 6) -> (100, 0) projected
  line L37 (100, 0) -> (80, 0) projected
  line L38 (80, 0) -> (80, 6) projected
  line L39 (120, 6) -> (126, 6) projected
  line L40 (126, 6) -> (126, 0) projected
  line L41 (126, 0) -> (120, 0) projected
  line L42 (120, 0) -> (120, 6) projected
  line L43 (-66, 6) -> (-60, 6) projected
  line L44 (-60, 6) -> (-60, 0) projected
  line L45 (-60, 0) -> (-66, 0) projected
  line L46 (-40, 6) -> (-20, 6) projected
  line L47 (-20, 6) -> (-20, 0) projected
  line L48 (-20, 0) -> (-40, 0) projected
  line L49 (-40, 0) -> (-40, 6) projected
  line L50 (0, 6) -> (60, 6) projected
  line L51 (60, 6) -> (60, 0) projected
  line L52 (60, 0) -> (0, 0) projected
  line L53 (0, 0) -> (0, 6) projected
  line L54 (80, 6) -> (100, 6) projected
  line L55 (100, 6) -> (100, 0) projected
  line L56 (100, 0) -> (80, 0) projected
  line L57 (80, 0) -> (80, 6) projected
  line L58 (120, 6) -> (126, 6) projected
  line L59 (126, 6) -> (126, 0) projected
  line L60 (126, 0) -> (120, 0) projected
  line L61 (120, 0) -> (120, 6) projected
  line L62 (120, 6) -> (126, 6) projected
  line L63 (126, 0) -> (126, 6) projected
  line L64 (120, 0) -> (126, 0) projected
  line L65 (-66, 0) -> (-66, 6) projected
  line L66 (-66, 0) -> (-66, 6) projected
extrude "Выдавливание6" add sketch "Эскиз6" along normal blind 6
sketch "Эскиз7" plane through (0, 0, 0) normal (0, -1, 0) x (1, 0, 0)
  circle A0 centre (-3, 12.5) radius 1.5
  line L0 (0, 0) -> (0, 226) projected
  line L1 (-26, 6) -> (-6, 6) projected
  circle A1 centre (-189, 12.5) radius 1.5
  line L2 (-192, 0) -> (-192, 226) projected
  line L3 (-186, 6) -> (-166, 6) projected
  dimension "d61" = 3
  dimension "d62" = 3
  dimension "d64" = 6.5
  dimension "d65" = 3
  dimension "d66" = 3
  dimension "d67" = 6.5
extrude "Выдавливание7" cut sketch "Эскиз7" against normal through all
sketch "Эскиз8" plane through (0, 0, 0) normal (0, -1, 0) x (1, 0, 0)
  circle A0 centre (-11, 167) radius 1.5
  circle A1 centre (-11, 72) radius 1.5
  circle A2 centre (-156, 167) radius 1.5
  circle A3 centre (-156, 72) radius 1.5
  line L0 (-46, 220) -> (-26, 220) projected
  line L1 (-166, 214) -> (-186, 214) projected
  line L2 (0, 0) -> (0, 226) projected
  dimension "d70" = 95
  dimension "d71" = 95
  dimension "d72" = 145
  dimension "d73" = 3
  dimension "d74" = 3
  dimension "d75" = 3
  dimension "d76" = 3
  dimension "d77" = 53
  dimension "d78" = 47
  dimension "d79" = 11
  dimension "d80" = 11
  dimension "d81" = 145
extrude "Выдавливание8" cut sketch "Эскиз8" against normal through all
equation "\"d26\" = d24"
equation "\"d27\" = d24"
equation "\"d28\" = d24"
equation "\"d29\" = d24"
equation "\"d30\" = d24"
equation "\"d39\" = d37"
equation "\"d43\" = d37"
equation "\"d46\" = d37"
equation "\"d74\" = d73"
equation "\"d75\" = d73"
equation "\"d76\" = d73"
properties part number "дно_пробитое"
